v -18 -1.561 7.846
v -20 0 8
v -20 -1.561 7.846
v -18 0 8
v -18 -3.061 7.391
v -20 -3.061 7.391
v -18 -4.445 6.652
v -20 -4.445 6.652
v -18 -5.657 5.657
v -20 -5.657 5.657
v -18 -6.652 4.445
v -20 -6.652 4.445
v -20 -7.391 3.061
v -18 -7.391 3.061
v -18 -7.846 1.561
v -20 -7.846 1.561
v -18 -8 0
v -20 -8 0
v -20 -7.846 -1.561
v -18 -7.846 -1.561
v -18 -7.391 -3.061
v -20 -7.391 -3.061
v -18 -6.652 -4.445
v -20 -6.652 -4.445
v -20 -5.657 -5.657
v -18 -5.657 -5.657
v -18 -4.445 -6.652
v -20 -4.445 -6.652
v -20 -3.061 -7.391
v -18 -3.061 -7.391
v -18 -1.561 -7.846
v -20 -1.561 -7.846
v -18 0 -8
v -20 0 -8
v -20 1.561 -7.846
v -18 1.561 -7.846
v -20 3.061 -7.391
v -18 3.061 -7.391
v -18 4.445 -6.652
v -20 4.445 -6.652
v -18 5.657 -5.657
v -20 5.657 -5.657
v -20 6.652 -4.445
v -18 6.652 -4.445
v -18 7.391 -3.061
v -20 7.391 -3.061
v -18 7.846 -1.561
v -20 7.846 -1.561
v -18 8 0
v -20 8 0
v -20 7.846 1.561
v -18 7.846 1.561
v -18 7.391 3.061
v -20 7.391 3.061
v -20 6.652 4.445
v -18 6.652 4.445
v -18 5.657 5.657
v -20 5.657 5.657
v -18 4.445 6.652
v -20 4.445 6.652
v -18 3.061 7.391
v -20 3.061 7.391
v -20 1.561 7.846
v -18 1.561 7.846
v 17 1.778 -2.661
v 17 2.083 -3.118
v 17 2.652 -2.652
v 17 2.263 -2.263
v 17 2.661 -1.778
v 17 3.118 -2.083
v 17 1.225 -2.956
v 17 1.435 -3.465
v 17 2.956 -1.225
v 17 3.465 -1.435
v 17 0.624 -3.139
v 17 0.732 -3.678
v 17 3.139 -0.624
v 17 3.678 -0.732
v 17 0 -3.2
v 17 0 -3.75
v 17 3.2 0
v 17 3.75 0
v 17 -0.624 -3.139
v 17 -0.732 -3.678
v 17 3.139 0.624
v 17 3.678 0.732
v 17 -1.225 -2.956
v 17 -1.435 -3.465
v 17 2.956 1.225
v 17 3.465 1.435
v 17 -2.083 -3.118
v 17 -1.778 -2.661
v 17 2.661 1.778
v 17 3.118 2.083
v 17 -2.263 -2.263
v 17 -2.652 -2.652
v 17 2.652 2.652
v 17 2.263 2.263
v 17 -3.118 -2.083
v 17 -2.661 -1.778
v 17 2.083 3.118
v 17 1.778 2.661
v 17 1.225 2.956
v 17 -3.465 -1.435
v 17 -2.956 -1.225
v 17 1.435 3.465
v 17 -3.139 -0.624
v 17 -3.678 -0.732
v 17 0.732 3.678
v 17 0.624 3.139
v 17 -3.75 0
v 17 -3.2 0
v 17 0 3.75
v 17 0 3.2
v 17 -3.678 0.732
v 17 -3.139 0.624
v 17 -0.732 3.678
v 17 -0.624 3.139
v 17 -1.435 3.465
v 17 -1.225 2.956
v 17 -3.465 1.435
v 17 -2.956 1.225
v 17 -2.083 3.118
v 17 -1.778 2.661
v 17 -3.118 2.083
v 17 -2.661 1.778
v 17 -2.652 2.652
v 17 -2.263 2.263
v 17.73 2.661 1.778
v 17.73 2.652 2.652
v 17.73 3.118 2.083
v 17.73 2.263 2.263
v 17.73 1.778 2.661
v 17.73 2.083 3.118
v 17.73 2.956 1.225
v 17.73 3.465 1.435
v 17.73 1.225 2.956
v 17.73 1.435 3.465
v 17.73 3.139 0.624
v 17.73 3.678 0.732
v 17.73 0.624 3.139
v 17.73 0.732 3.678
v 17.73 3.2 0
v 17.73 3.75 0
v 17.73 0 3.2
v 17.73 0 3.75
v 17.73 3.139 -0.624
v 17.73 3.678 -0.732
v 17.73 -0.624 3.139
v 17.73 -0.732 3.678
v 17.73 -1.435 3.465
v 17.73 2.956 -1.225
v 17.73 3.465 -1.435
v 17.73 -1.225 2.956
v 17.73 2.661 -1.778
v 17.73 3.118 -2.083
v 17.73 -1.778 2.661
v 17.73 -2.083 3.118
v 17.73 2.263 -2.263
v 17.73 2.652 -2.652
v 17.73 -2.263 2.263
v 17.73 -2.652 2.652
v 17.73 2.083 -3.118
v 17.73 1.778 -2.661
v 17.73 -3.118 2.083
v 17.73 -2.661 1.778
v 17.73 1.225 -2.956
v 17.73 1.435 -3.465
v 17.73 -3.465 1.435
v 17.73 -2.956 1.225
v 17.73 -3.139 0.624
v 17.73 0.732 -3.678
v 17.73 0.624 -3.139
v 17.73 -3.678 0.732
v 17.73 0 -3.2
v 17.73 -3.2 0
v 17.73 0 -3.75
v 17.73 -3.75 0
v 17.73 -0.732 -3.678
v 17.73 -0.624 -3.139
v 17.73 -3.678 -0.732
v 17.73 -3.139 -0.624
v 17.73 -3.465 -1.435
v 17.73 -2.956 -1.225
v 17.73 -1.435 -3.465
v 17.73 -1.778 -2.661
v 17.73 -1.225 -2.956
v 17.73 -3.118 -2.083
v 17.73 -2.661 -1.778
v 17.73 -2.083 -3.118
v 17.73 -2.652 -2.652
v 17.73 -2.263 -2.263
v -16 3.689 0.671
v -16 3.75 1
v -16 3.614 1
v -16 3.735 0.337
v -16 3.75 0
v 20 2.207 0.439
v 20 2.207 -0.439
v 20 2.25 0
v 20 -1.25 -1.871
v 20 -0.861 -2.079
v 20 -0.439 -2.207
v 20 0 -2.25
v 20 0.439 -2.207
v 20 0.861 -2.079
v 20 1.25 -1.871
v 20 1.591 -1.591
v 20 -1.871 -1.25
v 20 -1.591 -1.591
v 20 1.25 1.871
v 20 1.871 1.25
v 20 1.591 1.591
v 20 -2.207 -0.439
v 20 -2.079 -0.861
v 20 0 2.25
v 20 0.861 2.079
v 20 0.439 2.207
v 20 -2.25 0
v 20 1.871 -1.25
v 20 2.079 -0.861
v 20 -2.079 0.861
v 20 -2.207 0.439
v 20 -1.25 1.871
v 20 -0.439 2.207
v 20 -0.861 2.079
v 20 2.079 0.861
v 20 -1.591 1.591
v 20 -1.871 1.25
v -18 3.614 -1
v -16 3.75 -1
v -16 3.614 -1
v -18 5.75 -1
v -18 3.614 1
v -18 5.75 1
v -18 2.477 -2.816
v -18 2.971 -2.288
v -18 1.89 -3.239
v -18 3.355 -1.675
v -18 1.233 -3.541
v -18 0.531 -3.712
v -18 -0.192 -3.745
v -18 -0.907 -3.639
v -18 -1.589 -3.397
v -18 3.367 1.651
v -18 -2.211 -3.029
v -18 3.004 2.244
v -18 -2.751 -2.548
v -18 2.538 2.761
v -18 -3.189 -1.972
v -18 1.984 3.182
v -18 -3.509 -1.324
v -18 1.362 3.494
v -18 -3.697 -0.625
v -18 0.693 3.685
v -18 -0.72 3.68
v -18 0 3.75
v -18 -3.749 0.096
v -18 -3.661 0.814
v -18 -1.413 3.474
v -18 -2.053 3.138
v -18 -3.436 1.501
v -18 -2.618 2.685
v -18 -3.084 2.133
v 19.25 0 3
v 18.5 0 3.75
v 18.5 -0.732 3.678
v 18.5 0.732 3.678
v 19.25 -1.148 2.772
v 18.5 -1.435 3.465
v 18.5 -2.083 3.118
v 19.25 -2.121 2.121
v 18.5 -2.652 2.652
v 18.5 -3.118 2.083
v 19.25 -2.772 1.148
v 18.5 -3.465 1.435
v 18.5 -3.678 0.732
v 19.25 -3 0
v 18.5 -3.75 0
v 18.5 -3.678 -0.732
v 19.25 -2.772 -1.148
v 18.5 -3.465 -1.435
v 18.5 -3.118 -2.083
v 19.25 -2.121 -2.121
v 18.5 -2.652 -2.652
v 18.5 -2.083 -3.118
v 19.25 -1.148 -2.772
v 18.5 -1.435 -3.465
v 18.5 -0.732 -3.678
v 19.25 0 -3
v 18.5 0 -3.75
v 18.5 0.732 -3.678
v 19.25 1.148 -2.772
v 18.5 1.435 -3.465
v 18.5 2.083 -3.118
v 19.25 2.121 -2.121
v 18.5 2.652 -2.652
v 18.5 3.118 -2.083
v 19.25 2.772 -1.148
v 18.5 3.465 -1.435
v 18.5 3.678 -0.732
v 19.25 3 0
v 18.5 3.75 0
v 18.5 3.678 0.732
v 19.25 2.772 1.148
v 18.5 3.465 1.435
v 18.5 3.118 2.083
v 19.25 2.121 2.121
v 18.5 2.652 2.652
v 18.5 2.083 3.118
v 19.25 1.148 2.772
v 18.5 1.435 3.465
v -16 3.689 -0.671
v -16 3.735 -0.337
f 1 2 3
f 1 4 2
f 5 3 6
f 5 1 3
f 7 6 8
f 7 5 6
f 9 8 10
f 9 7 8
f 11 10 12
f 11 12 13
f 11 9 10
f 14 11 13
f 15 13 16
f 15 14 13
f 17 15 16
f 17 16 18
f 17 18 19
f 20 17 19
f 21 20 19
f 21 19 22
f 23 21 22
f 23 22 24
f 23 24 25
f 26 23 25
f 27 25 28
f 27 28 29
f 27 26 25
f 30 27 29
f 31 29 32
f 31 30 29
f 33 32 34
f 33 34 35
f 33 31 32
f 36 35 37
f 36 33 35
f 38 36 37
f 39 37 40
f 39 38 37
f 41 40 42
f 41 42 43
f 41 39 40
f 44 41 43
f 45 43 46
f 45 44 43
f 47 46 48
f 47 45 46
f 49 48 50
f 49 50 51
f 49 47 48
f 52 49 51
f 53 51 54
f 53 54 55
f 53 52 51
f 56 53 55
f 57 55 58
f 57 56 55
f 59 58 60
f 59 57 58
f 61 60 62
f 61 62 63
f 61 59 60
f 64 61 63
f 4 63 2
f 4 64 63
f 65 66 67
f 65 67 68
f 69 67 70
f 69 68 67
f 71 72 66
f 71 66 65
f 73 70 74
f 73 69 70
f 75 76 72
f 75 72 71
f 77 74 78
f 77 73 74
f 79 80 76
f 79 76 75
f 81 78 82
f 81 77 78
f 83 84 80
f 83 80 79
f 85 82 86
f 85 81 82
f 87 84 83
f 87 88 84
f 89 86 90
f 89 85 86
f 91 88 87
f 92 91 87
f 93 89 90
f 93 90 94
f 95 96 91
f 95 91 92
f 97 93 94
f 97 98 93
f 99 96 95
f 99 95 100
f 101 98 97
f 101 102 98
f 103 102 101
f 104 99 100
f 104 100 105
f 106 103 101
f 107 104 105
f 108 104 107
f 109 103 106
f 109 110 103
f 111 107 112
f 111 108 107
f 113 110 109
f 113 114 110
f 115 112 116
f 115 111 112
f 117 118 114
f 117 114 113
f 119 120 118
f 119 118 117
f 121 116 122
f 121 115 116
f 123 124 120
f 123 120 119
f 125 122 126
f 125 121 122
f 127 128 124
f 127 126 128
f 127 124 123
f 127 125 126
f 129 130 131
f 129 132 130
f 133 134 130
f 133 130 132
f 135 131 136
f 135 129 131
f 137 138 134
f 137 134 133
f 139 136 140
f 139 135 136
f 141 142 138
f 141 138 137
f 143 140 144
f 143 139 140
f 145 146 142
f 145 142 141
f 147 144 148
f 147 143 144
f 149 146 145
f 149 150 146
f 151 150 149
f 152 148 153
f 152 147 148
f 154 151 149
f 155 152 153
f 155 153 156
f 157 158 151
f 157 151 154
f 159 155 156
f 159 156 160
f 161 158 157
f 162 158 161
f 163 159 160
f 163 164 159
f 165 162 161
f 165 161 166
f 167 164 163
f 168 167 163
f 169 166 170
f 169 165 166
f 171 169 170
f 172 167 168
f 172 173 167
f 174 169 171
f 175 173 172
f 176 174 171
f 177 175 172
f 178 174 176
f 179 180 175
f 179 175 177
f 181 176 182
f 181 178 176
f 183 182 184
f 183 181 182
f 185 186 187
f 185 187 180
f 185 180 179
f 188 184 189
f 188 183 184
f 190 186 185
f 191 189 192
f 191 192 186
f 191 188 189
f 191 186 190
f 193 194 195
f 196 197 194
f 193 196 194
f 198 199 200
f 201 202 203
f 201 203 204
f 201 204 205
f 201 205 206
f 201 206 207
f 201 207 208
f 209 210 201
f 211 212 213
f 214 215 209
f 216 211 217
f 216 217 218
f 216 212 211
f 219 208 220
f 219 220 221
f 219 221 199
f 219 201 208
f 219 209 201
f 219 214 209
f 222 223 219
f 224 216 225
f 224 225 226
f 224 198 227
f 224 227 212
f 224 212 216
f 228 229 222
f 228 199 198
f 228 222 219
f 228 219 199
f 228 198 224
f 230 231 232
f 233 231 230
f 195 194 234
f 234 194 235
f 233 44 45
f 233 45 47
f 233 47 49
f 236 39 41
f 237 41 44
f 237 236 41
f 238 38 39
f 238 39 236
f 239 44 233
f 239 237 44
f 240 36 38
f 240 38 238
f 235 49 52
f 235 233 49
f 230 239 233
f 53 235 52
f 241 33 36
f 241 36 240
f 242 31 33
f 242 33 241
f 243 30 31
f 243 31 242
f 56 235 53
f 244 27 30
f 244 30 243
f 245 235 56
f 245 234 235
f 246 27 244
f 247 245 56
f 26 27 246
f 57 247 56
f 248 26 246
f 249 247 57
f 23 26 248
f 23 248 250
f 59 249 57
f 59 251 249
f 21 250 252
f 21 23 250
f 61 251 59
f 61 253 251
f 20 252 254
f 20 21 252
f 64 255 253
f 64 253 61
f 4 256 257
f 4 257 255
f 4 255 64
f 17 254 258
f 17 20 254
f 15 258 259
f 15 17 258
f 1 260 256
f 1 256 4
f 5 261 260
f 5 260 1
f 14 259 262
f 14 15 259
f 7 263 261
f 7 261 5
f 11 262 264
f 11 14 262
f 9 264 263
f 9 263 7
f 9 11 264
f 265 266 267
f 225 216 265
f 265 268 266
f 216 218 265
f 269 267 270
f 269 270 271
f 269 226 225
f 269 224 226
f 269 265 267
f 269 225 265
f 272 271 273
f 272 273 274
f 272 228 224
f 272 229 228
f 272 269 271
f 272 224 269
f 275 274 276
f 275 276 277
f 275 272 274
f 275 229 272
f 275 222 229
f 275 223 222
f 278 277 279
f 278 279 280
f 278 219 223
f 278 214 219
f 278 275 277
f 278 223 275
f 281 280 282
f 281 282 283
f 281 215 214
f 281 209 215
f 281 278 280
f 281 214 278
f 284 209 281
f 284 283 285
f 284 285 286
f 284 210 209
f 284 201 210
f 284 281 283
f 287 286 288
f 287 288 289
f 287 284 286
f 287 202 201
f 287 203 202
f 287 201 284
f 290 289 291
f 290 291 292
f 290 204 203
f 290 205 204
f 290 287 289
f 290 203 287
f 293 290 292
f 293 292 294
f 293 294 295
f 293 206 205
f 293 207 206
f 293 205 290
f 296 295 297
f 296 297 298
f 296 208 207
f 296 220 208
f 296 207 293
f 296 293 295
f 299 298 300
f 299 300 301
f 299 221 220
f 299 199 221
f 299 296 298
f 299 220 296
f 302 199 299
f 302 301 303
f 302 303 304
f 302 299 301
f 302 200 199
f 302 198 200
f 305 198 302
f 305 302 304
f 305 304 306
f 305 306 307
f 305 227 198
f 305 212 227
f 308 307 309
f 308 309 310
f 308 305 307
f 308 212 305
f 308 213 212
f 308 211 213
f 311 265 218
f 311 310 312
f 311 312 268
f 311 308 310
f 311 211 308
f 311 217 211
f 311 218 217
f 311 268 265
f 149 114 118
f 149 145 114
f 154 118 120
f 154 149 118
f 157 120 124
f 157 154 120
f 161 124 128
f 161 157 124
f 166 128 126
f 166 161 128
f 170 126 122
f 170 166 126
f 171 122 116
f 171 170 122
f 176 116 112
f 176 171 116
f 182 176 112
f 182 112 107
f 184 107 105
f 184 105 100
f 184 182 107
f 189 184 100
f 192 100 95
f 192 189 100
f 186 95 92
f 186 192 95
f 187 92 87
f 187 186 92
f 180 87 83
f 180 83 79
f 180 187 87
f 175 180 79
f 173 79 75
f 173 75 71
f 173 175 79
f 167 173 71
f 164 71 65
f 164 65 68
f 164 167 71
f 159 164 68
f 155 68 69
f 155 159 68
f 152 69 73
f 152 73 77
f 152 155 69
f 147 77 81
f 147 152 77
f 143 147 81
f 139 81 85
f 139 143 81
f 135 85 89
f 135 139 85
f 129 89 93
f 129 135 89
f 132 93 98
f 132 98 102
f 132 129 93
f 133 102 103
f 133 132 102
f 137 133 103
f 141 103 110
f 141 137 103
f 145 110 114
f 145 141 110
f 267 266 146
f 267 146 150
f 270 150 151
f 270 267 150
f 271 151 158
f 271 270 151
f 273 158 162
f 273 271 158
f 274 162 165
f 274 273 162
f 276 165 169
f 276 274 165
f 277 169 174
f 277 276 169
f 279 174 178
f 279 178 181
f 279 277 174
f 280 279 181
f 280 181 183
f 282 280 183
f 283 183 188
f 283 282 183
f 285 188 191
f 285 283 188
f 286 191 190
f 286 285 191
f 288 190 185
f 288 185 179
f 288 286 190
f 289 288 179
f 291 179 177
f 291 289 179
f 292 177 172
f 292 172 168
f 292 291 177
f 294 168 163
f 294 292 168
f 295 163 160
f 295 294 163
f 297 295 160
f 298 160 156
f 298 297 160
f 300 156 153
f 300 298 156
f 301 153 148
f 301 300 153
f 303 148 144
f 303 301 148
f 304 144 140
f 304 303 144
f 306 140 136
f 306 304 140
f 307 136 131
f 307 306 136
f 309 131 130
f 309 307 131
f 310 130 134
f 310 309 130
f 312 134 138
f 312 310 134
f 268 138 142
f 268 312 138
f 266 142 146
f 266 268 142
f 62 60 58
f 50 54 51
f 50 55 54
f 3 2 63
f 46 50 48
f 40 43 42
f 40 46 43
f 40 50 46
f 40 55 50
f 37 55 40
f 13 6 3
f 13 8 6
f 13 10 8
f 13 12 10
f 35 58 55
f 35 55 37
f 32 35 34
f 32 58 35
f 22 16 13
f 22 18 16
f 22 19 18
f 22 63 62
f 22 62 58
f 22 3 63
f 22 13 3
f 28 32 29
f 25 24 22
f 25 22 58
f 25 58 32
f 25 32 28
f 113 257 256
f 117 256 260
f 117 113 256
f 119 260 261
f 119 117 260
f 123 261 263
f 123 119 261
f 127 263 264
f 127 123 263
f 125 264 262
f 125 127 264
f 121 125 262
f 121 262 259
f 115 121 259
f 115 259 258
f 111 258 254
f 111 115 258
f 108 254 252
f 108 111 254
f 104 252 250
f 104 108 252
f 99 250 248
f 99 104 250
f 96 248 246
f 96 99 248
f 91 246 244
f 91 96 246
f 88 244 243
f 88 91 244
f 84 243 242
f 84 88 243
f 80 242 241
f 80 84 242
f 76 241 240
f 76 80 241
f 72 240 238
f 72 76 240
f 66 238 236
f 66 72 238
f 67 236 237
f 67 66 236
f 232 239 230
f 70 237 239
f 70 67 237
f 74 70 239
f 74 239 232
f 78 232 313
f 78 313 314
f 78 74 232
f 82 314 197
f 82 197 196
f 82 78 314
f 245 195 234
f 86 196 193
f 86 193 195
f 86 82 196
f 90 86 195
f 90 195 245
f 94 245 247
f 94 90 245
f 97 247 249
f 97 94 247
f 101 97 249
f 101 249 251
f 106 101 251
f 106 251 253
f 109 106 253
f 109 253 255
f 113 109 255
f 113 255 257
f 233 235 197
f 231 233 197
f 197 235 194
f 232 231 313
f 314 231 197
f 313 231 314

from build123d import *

# Parameters (mm, degrees)
RIB_DEPTH     = 1
CHAMFER1_SIZE = 1.5


with BuildPart() as part:
    # Sketch1 → Main Body (revolve)
    with BuildSketch(Plane.XY, mode=Mode.PRIVATE) as main_body_sk:
        Polygon((-20, 0), (-20, 8), (-18, 8), (-18, 3.75), (17, 3.75), (17, 3.2), (17.73, 3.2), (17.73, 3.75), (20, 3.75), (20, 0), align=None)
    revolve(main_body_sk.sketch.rotate(Axis((-20, 0, 0), (1, 0, 0)), 90), axis=Axis((-20, 0, 0), (1, 0, 0)))

    # Sketch2 → Rib (add, symmetric)
    with BuildSketch(Plane.XY):
        Polygon((-18, 5.75), (-16, 3.75), (-16, 2.75), (-19, 2.75), (-19, 5.75), align=None)
    extrude(amount=RIB_DEPTH, both=True)

    # Chamfer1
    chamfer1_edges = [part.edges().sort_by_distance(p)[0] for p in [
        (20, 0, -3.75),
    ]]
    chamfer(chamfer1_edges, length=CHAMFER1_SIZE)


solid = part.part
